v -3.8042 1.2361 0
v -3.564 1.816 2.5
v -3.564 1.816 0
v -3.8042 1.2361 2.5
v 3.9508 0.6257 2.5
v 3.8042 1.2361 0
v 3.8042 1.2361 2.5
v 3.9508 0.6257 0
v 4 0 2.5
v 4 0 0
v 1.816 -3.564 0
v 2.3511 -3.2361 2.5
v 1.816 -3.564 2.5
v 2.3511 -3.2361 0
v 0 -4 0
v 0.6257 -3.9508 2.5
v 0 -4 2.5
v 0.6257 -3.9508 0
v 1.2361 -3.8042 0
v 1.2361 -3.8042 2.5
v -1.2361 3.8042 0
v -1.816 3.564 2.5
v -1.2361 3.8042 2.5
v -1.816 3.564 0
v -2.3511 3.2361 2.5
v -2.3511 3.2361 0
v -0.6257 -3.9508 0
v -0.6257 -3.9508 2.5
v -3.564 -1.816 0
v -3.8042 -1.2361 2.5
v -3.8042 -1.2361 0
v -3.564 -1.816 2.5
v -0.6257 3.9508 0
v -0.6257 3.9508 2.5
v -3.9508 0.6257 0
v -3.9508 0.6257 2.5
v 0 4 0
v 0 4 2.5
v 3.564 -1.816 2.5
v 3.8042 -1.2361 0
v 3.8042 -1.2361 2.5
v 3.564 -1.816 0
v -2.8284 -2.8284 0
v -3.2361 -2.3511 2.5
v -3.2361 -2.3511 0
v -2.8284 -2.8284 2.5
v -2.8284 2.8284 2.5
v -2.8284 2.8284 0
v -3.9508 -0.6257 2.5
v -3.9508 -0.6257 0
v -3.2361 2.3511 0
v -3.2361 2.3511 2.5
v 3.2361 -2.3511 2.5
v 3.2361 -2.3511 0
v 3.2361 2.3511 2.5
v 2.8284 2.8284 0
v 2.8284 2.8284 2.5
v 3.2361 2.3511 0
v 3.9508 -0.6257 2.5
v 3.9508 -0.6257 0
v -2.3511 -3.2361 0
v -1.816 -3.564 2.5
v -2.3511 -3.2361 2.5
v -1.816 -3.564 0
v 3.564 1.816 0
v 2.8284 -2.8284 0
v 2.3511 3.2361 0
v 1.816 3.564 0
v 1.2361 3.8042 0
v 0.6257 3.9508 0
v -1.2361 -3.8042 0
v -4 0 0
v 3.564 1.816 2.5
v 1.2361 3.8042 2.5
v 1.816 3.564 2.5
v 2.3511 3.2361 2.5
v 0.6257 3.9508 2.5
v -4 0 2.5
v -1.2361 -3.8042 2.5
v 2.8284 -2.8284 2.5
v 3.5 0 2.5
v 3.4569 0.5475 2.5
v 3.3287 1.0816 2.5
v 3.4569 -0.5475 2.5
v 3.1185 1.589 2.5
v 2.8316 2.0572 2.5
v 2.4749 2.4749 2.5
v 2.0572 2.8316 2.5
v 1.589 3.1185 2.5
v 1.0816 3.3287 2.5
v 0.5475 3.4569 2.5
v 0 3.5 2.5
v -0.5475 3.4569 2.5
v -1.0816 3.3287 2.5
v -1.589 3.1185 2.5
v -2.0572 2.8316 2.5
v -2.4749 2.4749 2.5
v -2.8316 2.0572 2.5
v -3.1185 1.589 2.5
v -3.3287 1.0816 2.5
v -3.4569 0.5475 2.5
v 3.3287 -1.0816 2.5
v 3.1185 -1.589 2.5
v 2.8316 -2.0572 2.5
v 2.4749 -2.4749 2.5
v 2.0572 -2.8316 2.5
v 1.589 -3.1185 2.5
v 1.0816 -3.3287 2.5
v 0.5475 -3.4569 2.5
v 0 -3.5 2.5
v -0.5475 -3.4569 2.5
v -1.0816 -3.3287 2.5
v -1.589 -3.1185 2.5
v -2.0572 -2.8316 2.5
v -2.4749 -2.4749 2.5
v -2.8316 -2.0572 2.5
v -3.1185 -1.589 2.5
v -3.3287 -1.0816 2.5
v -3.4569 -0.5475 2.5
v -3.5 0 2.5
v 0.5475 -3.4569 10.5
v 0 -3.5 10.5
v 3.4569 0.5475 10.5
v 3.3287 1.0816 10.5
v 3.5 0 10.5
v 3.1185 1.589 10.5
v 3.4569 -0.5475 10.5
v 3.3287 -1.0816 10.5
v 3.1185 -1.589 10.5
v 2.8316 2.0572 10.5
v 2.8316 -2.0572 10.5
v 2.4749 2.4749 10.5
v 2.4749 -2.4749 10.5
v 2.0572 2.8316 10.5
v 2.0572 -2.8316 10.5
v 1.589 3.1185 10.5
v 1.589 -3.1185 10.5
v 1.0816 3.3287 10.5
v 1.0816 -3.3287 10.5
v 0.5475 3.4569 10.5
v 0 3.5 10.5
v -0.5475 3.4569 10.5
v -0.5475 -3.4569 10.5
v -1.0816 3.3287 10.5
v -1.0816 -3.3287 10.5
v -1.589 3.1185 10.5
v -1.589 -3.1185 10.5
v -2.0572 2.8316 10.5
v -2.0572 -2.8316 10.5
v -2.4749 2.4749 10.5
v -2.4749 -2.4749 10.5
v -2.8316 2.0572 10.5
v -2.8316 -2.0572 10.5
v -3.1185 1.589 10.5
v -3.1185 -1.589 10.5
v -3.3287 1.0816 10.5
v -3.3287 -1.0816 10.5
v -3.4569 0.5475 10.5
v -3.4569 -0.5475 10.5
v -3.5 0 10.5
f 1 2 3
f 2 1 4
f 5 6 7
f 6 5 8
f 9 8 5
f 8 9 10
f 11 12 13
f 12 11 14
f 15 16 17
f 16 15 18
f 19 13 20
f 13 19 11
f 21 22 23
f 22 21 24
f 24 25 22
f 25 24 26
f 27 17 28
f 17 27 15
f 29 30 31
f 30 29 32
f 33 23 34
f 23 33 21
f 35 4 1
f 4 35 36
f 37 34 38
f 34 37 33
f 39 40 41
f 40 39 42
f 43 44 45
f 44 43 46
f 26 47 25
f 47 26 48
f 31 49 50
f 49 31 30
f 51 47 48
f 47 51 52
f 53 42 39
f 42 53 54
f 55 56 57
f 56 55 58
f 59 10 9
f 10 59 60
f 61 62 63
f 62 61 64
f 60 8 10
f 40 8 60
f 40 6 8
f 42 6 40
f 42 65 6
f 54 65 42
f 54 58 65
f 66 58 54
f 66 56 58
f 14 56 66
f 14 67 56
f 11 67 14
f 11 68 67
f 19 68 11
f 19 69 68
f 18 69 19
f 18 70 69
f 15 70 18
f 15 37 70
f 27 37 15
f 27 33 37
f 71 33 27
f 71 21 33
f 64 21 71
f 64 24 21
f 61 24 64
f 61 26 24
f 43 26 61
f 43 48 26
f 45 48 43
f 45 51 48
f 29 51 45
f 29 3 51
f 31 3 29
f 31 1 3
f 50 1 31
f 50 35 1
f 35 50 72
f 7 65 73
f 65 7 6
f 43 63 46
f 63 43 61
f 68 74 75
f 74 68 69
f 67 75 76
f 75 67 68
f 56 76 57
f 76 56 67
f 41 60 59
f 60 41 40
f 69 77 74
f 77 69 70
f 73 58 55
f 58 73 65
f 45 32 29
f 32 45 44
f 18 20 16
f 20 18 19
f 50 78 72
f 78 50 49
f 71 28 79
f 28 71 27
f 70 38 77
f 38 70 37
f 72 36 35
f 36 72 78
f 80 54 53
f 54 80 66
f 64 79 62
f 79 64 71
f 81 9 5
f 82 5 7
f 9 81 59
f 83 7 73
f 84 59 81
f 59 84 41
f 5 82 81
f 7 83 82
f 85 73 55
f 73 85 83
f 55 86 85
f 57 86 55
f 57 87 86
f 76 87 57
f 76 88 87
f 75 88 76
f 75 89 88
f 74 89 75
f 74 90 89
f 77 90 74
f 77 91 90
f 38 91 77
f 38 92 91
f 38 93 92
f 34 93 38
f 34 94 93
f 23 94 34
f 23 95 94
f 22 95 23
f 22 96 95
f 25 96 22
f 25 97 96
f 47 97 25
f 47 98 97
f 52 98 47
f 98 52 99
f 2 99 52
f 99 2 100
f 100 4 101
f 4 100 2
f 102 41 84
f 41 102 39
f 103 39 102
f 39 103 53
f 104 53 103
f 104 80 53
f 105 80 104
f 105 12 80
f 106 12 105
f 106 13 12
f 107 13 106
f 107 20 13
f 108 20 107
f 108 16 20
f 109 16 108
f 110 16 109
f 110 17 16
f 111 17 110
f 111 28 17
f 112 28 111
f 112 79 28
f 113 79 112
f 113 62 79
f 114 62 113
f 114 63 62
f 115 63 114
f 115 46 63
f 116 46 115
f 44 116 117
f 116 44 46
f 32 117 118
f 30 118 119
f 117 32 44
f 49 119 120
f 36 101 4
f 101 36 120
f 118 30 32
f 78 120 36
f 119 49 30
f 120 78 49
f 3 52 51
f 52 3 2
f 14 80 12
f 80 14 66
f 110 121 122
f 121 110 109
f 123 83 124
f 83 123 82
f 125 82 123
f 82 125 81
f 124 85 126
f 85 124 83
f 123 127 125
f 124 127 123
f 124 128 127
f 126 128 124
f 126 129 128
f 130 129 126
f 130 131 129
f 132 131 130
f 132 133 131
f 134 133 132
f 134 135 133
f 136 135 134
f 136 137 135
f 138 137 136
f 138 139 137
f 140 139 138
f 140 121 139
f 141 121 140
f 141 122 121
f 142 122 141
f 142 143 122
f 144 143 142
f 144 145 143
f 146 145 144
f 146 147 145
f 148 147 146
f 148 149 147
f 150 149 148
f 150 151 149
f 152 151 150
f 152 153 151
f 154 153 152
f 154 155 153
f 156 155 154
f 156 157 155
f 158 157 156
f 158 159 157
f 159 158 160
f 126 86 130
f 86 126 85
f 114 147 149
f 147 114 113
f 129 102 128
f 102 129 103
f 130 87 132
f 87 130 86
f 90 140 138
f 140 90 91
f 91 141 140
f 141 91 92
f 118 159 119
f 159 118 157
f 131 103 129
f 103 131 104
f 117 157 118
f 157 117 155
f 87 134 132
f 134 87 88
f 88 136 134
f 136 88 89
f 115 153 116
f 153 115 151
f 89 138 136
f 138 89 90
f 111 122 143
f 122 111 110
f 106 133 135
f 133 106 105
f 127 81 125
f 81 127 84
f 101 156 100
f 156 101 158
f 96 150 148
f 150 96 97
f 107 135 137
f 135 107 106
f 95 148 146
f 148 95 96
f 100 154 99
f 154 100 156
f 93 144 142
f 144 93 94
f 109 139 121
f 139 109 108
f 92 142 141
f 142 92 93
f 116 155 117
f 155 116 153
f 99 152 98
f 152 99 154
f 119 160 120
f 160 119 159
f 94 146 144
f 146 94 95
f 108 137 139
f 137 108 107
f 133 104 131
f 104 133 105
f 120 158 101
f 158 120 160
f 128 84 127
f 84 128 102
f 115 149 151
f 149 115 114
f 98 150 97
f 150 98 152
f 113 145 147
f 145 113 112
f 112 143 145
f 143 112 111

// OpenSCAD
outerDiameter=8.0;
innerDiameter=7.0;
length=8.0;
capHeight=2.5;

$fn=40;

cylinder(d=outerDiameter, h=capHeight);
cylinder(d=innerDiameter, h=capHeight+length);
